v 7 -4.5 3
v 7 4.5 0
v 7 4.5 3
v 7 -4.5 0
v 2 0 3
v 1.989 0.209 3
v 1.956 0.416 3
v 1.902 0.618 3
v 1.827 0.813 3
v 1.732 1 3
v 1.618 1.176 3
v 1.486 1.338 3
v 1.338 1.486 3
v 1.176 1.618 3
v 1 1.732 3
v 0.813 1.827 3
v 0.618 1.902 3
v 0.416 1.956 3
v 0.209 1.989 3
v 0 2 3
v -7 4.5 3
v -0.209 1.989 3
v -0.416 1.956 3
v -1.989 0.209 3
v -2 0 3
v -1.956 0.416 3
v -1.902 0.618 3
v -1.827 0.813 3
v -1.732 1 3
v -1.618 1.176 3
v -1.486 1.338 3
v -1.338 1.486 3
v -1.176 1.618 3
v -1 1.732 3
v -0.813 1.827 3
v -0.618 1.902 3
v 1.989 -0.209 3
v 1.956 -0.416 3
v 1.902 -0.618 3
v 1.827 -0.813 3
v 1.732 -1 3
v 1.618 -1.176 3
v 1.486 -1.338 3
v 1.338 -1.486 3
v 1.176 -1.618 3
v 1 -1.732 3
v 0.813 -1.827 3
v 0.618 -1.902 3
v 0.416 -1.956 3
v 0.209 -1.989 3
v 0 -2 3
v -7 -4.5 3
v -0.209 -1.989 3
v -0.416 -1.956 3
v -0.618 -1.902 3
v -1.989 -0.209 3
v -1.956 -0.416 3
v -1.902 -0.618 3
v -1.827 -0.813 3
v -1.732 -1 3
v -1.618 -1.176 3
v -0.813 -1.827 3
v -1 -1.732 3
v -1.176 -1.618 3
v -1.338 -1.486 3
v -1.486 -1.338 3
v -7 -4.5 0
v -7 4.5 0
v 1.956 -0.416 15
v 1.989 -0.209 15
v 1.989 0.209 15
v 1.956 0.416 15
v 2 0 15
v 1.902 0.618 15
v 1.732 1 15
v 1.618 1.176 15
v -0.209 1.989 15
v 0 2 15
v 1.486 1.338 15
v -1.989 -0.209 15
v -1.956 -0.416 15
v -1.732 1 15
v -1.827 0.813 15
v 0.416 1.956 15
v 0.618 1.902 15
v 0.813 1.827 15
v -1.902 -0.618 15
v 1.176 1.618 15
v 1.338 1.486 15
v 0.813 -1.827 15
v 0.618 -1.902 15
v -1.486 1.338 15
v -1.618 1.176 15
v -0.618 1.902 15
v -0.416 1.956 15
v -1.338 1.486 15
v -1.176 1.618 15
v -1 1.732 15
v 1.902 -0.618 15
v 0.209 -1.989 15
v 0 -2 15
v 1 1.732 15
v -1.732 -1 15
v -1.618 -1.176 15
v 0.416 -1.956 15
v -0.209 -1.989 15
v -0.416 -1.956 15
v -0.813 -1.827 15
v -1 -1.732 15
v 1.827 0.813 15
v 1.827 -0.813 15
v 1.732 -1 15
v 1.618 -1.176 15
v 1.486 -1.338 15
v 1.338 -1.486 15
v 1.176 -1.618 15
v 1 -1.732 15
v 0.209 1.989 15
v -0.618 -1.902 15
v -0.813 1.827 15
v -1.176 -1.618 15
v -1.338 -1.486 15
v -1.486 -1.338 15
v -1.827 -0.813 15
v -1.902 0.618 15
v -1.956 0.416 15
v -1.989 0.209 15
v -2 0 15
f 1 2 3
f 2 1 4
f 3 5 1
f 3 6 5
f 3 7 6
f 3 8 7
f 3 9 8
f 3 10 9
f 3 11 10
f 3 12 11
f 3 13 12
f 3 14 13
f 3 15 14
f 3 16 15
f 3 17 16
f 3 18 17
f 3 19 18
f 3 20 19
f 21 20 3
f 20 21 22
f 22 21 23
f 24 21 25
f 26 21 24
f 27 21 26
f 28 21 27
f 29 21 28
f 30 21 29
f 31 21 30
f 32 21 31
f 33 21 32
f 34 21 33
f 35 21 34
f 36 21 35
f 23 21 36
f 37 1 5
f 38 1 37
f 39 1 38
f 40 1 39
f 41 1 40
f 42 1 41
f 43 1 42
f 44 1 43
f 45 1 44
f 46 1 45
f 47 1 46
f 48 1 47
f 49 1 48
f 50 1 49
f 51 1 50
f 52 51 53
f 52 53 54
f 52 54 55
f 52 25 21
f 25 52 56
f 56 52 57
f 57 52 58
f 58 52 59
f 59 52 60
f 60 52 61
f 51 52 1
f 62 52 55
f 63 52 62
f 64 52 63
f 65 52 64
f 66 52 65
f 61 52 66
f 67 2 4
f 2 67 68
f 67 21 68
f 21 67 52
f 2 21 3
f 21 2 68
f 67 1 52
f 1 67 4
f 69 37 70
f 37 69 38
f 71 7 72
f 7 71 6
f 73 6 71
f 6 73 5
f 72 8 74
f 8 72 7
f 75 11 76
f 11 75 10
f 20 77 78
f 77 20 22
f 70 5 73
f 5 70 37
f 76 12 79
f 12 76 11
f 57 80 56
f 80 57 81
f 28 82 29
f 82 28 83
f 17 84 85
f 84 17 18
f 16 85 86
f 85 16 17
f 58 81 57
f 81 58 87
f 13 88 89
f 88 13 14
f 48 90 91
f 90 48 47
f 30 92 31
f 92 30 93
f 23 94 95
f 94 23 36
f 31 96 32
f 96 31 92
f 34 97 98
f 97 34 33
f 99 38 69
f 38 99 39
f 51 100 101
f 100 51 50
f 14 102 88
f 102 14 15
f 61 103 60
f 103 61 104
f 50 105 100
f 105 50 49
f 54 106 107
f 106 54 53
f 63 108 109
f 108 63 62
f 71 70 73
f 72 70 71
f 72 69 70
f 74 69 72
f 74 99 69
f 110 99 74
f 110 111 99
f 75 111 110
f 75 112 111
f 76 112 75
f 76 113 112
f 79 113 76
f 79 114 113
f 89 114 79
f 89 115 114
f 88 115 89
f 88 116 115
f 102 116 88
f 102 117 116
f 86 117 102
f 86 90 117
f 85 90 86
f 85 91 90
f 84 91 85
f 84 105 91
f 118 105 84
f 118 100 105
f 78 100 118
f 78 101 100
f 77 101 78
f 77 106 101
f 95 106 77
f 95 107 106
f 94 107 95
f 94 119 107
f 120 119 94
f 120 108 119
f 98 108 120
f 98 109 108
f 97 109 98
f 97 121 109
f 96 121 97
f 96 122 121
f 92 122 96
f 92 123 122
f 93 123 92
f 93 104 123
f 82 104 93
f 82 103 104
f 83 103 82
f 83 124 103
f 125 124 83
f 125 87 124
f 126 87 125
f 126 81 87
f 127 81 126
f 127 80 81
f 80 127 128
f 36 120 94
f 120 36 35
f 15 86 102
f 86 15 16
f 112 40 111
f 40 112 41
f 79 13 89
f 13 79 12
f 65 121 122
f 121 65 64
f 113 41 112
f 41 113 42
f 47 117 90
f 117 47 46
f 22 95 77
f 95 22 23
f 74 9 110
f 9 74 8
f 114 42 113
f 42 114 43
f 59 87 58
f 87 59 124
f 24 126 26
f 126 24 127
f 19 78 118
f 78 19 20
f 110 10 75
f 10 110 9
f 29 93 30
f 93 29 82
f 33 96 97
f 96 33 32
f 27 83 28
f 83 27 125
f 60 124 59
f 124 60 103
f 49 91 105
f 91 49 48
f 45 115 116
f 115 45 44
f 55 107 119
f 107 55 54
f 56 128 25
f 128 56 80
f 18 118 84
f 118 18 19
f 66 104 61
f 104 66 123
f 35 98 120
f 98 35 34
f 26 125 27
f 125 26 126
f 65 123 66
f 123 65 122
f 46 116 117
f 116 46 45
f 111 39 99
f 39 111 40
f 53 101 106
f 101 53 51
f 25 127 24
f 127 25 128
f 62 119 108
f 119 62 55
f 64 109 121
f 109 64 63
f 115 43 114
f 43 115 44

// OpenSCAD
// T-head slot bolt.
$fn = 60;
eps = 0.02;
shaft_d = 4;
head_l = 14;
shaft_l = 12;
head_w = shaft_d + 5;
head_h = 3;
union() {
    translate([-head_l/2,-head_w/2,0]) cube([head_l,head_w,head_h]);
    translate([0,0,head_h]) cylinder(d=shaft_d,h=shaft_l);
}
